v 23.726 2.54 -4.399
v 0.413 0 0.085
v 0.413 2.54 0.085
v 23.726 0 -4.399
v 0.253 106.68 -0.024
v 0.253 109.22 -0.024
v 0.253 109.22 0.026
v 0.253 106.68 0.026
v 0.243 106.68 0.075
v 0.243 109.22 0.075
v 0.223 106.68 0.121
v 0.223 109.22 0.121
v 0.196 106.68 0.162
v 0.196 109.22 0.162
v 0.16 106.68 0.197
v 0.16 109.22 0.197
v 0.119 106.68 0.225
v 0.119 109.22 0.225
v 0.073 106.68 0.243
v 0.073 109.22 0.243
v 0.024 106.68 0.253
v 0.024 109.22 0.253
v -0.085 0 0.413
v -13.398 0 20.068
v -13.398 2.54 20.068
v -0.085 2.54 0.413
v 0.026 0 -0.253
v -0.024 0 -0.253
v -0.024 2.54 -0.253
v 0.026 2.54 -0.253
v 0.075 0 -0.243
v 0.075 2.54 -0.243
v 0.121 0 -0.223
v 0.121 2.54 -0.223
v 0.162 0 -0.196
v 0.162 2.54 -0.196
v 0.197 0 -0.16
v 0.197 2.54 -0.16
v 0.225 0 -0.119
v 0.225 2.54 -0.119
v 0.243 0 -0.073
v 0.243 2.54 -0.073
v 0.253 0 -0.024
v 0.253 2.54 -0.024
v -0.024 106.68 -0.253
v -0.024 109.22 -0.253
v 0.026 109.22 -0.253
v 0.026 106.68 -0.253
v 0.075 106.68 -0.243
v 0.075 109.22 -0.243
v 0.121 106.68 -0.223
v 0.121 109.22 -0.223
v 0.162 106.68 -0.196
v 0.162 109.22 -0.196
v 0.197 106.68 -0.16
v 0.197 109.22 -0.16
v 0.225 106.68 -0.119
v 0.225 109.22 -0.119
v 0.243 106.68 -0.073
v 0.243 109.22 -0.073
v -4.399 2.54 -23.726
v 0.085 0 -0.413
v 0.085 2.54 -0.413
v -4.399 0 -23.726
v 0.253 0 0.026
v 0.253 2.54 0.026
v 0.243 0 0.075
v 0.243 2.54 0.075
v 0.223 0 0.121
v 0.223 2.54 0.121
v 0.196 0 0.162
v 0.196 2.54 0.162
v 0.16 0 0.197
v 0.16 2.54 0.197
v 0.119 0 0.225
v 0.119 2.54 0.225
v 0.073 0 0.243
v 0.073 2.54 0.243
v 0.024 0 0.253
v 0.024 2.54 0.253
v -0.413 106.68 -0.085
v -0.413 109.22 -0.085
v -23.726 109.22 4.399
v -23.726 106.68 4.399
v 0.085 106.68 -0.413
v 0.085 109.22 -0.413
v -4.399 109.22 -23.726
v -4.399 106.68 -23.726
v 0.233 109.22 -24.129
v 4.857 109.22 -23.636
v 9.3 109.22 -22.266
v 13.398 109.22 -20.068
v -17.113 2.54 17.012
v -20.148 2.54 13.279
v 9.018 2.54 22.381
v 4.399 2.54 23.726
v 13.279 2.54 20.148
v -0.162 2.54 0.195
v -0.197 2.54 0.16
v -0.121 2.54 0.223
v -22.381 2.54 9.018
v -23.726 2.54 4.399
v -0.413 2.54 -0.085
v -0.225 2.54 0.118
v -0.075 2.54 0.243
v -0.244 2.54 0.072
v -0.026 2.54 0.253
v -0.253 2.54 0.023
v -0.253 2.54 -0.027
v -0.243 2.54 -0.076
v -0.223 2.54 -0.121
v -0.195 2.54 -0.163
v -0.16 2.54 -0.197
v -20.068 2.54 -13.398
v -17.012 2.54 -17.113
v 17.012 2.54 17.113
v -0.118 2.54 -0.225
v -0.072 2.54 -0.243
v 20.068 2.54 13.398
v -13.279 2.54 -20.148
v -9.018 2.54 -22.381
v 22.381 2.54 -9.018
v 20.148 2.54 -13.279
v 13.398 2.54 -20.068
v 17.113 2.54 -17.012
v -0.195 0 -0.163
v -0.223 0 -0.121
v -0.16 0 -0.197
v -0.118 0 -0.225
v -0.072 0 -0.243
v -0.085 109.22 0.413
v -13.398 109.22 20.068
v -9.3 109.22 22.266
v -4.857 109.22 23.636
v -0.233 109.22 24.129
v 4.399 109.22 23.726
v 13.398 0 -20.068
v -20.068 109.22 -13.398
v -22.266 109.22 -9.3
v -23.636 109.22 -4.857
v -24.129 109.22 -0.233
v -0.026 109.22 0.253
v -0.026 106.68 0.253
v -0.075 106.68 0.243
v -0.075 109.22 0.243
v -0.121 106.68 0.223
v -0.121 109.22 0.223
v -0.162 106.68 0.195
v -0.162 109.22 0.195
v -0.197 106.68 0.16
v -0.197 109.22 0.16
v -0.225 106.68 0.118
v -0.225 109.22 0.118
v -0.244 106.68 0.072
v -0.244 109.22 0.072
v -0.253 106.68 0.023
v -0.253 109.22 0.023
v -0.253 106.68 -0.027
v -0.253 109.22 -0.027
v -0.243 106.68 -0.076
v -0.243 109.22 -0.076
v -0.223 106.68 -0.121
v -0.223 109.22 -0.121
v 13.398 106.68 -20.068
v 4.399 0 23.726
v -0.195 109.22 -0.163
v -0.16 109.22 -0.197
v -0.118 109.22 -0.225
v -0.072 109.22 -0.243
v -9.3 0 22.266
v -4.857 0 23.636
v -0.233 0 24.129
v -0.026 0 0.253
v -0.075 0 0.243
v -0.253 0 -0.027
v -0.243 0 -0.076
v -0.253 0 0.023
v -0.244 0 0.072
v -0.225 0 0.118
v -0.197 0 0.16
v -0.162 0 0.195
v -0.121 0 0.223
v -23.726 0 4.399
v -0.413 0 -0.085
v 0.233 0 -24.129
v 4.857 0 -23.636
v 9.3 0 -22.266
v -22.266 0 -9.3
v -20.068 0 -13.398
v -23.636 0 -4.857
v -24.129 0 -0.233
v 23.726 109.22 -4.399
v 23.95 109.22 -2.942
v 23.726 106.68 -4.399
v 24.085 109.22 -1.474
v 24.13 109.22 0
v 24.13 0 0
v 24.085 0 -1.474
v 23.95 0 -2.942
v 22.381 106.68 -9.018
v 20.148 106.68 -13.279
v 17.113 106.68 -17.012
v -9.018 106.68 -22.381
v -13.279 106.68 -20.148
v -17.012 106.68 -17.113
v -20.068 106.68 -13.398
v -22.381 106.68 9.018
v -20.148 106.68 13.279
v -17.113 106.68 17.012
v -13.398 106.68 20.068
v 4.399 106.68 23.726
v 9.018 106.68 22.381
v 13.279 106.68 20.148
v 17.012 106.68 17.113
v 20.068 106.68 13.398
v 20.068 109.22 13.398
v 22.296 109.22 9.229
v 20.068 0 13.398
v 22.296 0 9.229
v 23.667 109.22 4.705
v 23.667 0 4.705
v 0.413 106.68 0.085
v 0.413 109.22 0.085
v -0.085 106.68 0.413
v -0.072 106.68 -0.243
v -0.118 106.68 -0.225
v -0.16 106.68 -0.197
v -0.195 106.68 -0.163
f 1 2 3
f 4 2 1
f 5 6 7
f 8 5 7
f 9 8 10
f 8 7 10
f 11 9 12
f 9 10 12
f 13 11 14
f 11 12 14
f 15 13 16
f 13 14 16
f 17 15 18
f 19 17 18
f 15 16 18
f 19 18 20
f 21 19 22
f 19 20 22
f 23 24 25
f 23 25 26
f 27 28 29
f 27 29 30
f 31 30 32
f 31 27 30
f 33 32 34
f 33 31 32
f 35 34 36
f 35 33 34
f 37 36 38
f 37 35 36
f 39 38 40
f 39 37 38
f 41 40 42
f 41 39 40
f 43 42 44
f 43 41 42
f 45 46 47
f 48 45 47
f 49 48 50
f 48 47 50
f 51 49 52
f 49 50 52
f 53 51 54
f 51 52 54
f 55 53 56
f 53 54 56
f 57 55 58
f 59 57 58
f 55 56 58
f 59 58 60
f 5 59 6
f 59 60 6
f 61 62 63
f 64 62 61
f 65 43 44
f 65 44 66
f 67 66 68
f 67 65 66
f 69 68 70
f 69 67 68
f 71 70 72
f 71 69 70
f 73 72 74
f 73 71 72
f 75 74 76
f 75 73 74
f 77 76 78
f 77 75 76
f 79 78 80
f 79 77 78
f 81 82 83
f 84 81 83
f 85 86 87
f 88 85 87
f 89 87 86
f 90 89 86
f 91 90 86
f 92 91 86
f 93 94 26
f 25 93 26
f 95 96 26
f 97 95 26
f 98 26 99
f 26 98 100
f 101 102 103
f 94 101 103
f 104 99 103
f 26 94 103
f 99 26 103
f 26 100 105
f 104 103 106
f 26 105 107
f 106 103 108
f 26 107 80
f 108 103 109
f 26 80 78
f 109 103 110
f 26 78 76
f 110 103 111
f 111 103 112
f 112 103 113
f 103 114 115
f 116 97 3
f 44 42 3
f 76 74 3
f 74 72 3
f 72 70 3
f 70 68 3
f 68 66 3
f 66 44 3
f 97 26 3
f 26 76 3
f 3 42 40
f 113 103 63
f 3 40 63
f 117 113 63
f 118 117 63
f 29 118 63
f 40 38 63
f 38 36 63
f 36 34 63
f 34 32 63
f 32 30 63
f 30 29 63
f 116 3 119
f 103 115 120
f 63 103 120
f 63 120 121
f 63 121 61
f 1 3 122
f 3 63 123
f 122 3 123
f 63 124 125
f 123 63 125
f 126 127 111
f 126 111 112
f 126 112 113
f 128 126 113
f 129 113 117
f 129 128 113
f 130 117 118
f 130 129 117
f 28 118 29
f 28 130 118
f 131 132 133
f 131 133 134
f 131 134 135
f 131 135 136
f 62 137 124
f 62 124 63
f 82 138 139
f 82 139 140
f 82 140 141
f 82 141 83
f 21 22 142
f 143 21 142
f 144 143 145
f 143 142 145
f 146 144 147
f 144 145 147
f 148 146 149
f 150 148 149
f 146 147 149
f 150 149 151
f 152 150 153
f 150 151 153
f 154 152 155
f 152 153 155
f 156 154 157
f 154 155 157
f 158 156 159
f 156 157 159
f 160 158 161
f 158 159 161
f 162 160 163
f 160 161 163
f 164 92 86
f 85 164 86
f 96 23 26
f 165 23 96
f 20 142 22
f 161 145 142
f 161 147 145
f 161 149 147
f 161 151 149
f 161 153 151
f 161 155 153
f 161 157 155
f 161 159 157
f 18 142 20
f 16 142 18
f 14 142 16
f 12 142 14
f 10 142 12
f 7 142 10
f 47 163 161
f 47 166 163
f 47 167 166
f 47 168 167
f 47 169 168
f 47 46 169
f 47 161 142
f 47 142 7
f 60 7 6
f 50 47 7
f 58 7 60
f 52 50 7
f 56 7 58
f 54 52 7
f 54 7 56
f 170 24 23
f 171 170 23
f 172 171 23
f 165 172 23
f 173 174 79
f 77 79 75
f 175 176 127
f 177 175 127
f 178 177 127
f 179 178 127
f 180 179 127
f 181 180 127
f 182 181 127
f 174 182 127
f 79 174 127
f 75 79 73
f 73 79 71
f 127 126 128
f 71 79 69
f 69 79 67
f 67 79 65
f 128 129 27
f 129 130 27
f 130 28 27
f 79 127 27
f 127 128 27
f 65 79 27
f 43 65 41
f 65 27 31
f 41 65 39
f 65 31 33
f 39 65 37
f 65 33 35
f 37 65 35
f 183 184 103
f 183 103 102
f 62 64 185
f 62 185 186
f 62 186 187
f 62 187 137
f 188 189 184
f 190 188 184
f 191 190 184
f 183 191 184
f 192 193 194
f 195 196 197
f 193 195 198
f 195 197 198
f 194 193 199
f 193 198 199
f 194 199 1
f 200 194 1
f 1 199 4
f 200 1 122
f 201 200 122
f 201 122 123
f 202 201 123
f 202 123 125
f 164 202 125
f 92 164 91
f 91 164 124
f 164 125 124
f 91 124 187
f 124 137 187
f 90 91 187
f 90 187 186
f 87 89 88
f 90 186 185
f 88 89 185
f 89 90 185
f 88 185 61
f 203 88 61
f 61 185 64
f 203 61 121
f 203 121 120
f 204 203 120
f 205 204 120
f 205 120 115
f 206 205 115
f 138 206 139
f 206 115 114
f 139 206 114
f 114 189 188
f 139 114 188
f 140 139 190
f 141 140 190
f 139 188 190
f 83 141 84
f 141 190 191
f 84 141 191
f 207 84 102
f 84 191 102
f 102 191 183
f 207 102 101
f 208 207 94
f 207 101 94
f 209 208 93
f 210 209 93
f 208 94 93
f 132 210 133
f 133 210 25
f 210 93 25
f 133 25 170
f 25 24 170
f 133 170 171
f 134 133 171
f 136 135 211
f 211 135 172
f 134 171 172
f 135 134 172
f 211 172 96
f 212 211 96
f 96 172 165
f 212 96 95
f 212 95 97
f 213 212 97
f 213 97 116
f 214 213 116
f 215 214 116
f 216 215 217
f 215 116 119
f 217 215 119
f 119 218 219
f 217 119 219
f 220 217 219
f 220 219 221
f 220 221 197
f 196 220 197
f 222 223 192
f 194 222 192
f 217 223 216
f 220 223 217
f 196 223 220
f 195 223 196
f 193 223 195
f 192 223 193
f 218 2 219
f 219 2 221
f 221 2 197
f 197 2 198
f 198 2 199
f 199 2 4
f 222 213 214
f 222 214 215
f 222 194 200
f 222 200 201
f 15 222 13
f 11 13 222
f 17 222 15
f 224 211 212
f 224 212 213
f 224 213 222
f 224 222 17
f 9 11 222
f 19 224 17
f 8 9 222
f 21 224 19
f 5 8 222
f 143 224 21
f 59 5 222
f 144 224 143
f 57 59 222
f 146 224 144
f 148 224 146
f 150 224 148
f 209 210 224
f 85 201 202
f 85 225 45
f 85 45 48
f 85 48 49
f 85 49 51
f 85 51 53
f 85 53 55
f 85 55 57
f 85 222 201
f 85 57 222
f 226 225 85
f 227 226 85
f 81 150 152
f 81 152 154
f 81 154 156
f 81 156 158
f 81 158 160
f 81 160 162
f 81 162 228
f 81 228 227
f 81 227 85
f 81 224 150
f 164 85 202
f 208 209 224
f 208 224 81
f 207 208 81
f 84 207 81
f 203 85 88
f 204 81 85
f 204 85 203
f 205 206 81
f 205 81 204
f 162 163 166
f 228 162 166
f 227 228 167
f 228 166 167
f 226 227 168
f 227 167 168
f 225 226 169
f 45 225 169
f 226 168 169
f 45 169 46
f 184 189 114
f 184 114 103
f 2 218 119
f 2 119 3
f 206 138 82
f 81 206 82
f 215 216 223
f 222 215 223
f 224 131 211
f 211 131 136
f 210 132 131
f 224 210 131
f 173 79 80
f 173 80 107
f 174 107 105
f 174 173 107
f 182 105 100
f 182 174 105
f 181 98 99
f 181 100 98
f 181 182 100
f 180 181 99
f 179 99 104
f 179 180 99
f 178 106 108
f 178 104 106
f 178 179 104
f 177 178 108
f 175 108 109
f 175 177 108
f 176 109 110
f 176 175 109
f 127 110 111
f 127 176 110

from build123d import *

# Parameters (mm, degrees)
SKETCH1_R            = 24.13
BOSS_EXTRUDE1_DEPTH  = 109.22
CUT_EXTRUDE7_DEPTH   = 2.54
CIRPATTERN2_COUNT    = 4
MIRROR1_COPY_1_DEPTH = 2.54
MIRROR1_COPY_2_DEPTH = 2.54
MIRROR1_COPY_3_DEPTH = 2.54


with BuildPart() as part:
    # Sketch1 → Boss-Extrude1 (new body)
    with BuildSketch(Plane(origin=(0, 0, 0), x_dir=(1, 0, 0), z_dir=(0, 1, 0))):
        Circle(SKETCH1_R)
    extrude(amount=BOSS_EXTRUDE1_DEPTH)

    # Sketch2 → Cut-Extrude7 (cut)
    with BuildSketch(Plane(origin=(0, 109.22, 0), x_dir=(1, 0, 0), z_dir=(0, 1, 0))):
        with BuildLine():
            Line((-13.398366618, -20.068399836), (0.023672, -0.252894516))
            ThreePointArc((0.023672, -0.252894516), (-0.212080054, -0.139778577), (-0.223069042, 0.12147511))
            Line((-0.223069042, 0.12147511), (-23.725561751, -4.399388549))
            ThreePointArc((-23.725561751, -4.399388549), (-20.147605145, -13.278964829), (-13.398366618, -20.068399836))
        make_face()
    cut_extrude7 = extrude(amount=-CUT_EXTRUDE7_DEPTH, mode=Mode.SUBTRACT)

    # CirPattern2: Cut-Extrude7 ×4 about axis
    cirpattern2_axis = Axis((0, 0, 0), (0, 1, 0))
    for i in range(1, CIRPATTERN2_COUNT):
        add(cut_extrude7.rotate(cirpattern2_axis, i * 360 / CIRPATTERN2_COUNT), mode=Mode.SUBTRACT)

    # Mirror1: Cut-Extrude7 across plane
    add(cut_extrude7.mirror(Plane.ZX.offset(54.61)), mode=Mode.SUBTRACT)

    # Mirror1 copy 1 sketch → Mirror1 copy 1 (cut)
    with BuildSketch(Plane(origin=(0, 0, 0), x_dir=(0, 0, -1), z_dir=(0, -1, 0))):
        with BuildLine():
            Line((-13.398366618, 20.068399836), (0.023672, 0.252894516))
            ThreePointArc((0.023672, 0.252894516), (-0.212080054, 0.139778577), (-0.223069042, -0.12147511))
            Line((-0.223069042, -0.12147511), (-23.725561751, 4.399388549))
            ThreePointArc((-23.725561751, 4.399388549), (-20.147605145, 13.278964829), (-13.398366618, 20.068399836))
        make_face()
    extrude(amount=-MIRROR1_COPY_1_DEPTH, mode=Mode.SUBTRACT)

    # Mirror1 copy 2 sketch → Mirror1 copy 2 (cut)
    with BuildSketch(Plane(origin=(0, 0, 0), x_dir=(-1, 0, 0), z_dir=(0, -1, 0))):
        with BuildLine():
            Line((-13.398366618, 20.068399836), (0.023672, 0.252894516))
            ThreePointArc((0.023672, 0.252894516), (-0.212080054, 0.139778577), (-0.223069042, -0.12147511))
            Line((-0.223069042, -0.12147511), (-23.725561751, 4.399388549))
            ThreePointArc((-23.725561751, 4.399388549), (-20.147605145, 13.278964829), (-13.398366618, 20.068399836))
        make_face()
    extrude(amount=-MIRROR1_COPY_2_DEPTH, mode=Mode.SUBTRACT)

    # Mirror1 copy 3 sketch → Mirror1 copy 3 (cut)
    with BuildSketch(Plane(origin=(0, 0, 0), x_dir=(0, 0, 1), z_dir=(0, -1, 0))):
        with BuildLine():
            Line((-13.398366618, 20.068399836), (0.023672, 0.252894516))
            ThreePointArc((0.023672, 0.252894516), (-0.212080054, 0.139778577), (-0.223069042, -0.12147511))
            Line((-0.223069042, -0.12147511), (-23.725561751, 4.399388549))
            ThreePointArc((-23.725561751, 4.399388549), (-20.147605145, 13.278964829), (-13.398366618, 20.068399836))
        make_face()
    extrude(amount=-MIRROR1_COPY_3_DEPTH, mode=Mode.SUBTRACT)


solid = part.part
